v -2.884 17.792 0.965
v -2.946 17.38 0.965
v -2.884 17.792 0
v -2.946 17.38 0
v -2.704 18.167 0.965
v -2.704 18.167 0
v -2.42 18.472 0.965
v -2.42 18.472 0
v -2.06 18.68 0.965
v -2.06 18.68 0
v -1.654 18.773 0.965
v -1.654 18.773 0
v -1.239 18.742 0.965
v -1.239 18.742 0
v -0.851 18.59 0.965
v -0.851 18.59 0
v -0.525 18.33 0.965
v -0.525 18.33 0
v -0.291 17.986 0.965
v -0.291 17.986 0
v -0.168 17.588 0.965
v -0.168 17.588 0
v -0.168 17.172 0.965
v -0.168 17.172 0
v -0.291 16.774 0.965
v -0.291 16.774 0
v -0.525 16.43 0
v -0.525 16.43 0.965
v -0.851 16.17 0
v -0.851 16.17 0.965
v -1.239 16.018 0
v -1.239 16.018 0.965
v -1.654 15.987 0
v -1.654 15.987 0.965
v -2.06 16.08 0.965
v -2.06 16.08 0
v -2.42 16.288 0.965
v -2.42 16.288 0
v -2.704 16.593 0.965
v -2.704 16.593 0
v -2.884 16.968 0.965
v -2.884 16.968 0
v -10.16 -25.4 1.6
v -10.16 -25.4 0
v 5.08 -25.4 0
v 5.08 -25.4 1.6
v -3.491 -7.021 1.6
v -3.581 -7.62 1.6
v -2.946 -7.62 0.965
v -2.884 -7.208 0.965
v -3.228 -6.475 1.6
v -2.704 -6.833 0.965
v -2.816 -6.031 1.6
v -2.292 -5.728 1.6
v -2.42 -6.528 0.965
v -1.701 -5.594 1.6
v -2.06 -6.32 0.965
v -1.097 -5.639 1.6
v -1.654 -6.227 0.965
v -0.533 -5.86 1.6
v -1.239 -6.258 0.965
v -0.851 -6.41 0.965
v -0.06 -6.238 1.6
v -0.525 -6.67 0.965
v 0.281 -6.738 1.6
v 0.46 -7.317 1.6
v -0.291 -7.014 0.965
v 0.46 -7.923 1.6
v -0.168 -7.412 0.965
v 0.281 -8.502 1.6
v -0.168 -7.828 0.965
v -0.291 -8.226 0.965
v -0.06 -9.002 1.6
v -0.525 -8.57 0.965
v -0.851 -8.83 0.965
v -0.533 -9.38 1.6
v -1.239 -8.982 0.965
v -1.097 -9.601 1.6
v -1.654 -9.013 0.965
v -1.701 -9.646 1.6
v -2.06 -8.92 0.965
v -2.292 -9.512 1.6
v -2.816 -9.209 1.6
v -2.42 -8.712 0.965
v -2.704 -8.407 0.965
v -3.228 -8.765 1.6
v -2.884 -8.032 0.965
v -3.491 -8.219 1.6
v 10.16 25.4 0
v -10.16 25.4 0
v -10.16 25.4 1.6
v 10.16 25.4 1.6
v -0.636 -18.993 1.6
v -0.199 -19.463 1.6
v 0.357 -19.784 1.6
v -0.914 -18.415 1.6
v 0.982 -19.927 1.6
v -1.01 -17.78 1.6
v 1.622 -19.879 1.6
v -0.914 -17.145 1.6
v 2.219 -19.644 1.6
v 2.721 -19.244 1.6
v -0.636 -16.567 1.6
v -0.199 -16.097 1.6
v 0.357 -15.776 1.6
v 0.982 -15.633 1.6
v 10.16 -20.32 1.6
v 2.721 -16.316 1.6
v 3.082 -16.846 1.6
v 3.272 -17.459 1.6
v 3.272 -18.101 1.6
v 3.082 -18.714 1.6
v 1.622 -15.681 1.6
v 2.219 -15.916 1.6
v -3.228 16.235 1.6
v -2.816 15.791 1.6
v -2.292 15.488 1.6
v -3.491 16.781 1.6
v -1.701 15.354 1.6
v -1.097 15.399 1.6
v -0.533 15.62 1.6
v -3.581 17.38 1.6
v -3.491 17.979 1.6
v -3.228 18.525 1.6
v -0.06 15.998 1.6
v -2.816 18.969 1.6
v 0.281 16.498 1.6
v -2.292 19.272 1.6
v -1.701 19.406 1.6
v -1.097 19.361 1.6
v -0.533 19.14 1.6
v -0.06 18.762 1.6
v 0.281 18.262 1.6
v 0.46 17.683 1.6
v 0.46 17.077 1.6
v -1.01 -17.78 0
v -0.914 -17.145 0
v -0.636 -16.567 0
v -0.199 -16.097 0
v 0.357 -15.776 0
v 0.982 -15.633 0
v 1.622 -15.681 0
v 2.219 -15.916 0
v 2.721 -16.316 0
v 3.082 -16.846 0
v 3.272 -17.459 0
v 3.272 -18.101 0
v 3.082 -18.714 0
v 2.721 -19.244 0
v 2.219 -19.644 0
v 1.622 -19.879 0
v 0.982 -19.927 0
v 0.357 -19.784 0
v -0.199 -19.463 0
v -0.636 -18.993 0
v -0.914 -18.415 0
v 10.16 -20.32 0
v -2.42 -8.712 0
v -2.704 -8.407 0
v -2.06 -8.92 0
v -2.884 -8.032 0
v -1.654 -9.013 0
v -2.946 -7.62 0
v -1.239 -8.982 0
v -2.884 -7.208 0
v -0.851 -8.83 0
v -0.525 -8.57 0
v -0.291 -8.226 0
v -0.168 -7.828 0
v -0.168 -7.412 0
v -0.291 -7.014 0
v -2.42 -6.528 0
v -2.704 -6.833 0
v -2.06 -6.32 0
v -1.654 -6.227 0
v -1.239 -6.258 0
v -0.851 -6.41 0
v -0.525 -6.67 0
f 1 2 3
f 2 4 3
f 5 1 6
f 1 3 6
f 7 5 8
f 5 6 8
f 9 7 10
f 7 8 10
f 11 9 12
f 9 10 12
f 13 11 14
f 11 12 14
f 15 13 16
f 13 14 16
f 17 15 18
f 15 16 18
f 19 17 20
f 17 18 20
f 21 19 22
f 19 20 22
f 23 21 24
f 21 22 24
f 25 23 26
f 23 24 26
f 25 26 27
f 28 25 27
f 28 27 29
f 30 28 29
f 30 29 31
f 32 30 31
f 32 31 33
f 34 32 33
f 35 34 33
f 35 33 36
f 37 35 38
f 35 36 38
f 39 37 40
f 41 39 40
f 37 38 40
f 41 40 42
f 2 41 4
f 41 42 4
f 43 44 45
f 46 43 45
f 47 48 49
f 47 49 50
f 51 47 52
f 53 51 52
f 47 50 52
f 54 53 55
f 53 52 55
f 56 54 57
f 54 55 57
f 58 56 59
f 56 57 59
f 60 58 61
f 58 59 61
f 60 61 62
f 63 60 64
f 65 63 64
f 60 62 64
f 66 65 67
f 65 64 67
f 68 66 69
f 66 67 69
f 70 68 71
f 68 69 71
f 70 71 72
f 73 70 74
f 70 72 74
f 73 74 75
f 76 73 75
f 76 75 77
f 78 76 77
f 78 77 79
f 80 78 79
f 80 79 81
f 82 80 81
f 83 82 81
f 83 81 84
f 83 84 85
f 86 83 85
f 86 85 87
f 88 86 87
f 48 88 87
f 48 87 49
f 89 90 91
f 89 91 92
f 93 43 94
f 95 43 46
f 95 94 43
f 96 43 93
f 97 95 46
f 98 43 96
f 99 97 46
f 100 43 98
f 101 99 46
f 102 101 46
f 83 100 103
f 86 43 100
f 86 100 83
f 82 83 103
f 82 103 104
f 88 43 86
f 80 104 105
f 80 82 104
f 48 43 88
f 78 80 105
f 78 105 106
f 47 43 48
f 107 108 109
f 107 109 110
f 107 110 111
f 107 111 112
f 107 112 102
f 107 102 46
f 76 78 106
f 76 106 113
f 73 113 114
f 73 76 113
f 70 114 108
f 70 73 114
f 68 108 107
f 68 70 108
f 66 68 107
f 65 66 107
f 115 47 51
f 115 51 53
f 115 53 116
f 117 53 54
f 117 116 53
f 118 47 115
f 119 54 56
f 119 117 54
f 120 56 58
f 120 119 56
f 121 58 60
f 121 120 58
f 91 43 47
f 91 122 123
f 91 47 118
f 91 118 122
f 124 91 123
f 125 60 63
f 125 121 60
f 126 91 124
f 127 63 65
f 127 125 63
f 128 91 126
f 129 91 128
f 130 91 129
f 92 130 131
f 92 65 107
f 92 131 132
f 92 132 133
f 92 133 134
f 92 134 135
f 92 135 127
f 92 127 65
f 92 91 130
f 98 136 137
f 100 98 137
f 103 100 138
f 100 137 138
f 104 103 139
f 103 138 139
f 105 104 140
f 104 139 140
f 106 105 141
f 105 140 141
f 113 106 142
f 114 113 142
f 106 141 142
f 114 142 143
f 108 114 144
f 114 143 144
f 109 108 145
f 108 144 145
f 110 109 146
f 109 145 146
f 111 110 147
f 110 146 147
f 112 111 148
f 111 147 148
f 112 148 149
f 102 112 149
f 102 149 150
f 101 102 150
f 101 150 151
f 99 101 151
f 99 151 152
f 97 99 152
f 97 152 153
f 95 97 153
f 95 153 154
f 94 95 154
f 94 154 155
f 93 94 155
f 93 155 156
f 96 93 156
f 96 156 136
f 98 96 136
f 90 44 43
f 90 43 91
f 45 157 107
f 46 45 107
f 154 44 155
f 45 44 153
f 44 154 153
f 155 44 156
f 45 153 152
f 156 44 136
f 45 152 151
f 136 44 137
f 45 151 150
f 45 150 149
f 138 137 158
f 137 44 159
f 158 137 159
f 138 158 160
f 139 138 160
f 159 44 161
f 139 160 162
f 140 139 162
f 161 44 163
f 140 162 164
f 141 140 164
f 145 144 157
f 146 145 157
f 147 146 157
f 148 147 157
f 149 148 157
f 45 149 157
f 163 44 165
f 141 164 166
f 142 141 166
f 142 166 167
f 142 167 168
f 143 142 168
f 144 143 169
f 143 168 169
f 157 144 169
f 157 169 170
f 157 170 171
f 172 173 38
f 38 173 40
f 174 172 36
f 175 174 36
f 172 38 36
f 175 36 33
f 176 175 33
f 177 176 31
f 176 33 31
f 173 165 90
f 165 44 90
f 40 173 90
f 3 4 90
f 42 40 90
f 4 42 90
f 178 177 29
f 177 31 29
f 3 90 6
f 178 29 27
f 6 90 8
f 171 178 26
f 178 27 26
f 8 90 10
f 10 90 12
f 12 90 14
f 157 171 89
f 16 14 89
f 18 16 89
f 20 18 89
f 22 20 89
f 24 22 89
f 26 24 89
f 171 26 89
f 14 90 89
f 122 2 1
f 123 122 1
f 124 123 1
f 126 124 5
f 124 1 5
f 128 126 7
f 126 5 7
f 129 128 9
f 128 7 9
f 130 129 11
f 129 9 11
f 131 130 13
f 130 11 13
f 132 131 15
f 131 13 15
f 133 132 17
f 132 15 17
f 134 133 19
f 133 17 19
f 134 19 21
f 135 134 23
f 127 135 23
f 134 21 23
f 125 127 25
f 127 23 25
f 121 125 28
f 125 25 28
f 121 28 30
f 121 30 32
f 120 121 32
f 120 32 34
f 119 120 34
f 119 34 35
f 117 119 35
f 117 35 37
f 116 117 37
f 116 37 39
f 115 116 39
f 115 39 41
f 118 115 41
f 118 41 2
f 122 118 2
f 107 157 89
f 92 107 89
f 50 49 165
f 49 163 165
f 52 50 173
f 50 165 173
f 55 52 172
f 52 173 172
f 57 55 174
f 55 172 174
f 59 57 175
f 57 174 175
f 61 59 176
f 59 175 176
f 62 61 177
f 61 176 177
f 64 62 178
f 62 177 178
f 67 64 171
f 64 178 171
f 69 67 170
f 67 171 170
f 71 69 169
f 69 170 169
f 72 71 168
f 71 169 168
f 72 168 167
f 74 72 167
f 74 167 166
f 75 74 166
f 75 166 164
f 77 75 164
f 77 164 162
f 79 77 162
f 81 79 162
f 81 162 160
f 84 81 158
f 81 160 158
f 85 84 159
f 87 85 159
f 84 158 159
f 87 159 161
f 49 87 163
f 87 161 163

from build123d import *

# Parameters (mm, degrees)
SKETCH1_W                       = 20.32
SKETCH1_H                       = 50.8
BOSS_EXTRUDE1_DEPTH             = 1.6002
CHAMFER1_SIZE                   = 5.08
F_3_CLEARANCE_HOLE1_D           = 2.794
F_3_CLEARANCE_HOLE1_DEPTH       = 11.43
F_3_CLEARANCE_HOLE1_CSINK_D     = 4.064
F_3_CLEARANCE_HOLE1_CSINK_ANGLE = 90
F_3_CLEARANCE_HOLE1_TIP         = 0.839402285
F_8_CLEARANCE_HOLE1_D           = 4.3053


with BuildPart() as part:
    # Sketch1 → Boss-Extrude1 (new body)
    with BuildSketch(Plane.XY):
        Rectangle(SKETCH1_W, SKETCH1_H)
    extrude(amount=BOSS_EXTRUDE1_DEPTH)

    # Chamfer1
    chamfer1_edges = [part.edges().sort_by_distance(p)[0] for p in [
        (10.16, -25.4, 0.8001),
    ]]
    chamfer(chamfer1_edges, length=CHAMFER1_SIZE)

    # #3 Clearance Hole1
    with Locations(Plane(origin=(-1.5494, -7.62, 1.6002), x_dir=(1, 0, 0), z_dir=(0, 0, 1))):
        with Locations((0, 0), (0, 25)):
            CounterSinkHole(F_3_CLEARANCE_HOLE1_D / 2, F_3_CLEARANCE_HOLE1_CSINK_D / 2, depth=F_3_CLEARANCE_HOLE1_DEPTH, counter_sink_angle=F_3_CLEARANCE_HOLE1_CSINK_ANGLE)
            with Locations((0, 0, -(F_3_CLEARANCE_HOLE1_DEPTH + F_3_CLEARANCE_HOLE1_TIP / 2))):  # 118° drill point
                Cone(0, F_3_CLEARANCE_HOLE1_D / 2, F_3_CLEARANCE_HOLE1_TIP, mode=Mode.SUBTRACT)

    # #8 Clearance Hole1 (through all)
    with Locations(Plane(origin=(1.143, -17.78, 1.6002), x_dir=(1, 0, 0), z_dir=(0, 0, 1))):
        with Locations((0, 0)):
            Hole(F_8_CLEARANCE_HOLE1_D / 2)


solid = part.part
